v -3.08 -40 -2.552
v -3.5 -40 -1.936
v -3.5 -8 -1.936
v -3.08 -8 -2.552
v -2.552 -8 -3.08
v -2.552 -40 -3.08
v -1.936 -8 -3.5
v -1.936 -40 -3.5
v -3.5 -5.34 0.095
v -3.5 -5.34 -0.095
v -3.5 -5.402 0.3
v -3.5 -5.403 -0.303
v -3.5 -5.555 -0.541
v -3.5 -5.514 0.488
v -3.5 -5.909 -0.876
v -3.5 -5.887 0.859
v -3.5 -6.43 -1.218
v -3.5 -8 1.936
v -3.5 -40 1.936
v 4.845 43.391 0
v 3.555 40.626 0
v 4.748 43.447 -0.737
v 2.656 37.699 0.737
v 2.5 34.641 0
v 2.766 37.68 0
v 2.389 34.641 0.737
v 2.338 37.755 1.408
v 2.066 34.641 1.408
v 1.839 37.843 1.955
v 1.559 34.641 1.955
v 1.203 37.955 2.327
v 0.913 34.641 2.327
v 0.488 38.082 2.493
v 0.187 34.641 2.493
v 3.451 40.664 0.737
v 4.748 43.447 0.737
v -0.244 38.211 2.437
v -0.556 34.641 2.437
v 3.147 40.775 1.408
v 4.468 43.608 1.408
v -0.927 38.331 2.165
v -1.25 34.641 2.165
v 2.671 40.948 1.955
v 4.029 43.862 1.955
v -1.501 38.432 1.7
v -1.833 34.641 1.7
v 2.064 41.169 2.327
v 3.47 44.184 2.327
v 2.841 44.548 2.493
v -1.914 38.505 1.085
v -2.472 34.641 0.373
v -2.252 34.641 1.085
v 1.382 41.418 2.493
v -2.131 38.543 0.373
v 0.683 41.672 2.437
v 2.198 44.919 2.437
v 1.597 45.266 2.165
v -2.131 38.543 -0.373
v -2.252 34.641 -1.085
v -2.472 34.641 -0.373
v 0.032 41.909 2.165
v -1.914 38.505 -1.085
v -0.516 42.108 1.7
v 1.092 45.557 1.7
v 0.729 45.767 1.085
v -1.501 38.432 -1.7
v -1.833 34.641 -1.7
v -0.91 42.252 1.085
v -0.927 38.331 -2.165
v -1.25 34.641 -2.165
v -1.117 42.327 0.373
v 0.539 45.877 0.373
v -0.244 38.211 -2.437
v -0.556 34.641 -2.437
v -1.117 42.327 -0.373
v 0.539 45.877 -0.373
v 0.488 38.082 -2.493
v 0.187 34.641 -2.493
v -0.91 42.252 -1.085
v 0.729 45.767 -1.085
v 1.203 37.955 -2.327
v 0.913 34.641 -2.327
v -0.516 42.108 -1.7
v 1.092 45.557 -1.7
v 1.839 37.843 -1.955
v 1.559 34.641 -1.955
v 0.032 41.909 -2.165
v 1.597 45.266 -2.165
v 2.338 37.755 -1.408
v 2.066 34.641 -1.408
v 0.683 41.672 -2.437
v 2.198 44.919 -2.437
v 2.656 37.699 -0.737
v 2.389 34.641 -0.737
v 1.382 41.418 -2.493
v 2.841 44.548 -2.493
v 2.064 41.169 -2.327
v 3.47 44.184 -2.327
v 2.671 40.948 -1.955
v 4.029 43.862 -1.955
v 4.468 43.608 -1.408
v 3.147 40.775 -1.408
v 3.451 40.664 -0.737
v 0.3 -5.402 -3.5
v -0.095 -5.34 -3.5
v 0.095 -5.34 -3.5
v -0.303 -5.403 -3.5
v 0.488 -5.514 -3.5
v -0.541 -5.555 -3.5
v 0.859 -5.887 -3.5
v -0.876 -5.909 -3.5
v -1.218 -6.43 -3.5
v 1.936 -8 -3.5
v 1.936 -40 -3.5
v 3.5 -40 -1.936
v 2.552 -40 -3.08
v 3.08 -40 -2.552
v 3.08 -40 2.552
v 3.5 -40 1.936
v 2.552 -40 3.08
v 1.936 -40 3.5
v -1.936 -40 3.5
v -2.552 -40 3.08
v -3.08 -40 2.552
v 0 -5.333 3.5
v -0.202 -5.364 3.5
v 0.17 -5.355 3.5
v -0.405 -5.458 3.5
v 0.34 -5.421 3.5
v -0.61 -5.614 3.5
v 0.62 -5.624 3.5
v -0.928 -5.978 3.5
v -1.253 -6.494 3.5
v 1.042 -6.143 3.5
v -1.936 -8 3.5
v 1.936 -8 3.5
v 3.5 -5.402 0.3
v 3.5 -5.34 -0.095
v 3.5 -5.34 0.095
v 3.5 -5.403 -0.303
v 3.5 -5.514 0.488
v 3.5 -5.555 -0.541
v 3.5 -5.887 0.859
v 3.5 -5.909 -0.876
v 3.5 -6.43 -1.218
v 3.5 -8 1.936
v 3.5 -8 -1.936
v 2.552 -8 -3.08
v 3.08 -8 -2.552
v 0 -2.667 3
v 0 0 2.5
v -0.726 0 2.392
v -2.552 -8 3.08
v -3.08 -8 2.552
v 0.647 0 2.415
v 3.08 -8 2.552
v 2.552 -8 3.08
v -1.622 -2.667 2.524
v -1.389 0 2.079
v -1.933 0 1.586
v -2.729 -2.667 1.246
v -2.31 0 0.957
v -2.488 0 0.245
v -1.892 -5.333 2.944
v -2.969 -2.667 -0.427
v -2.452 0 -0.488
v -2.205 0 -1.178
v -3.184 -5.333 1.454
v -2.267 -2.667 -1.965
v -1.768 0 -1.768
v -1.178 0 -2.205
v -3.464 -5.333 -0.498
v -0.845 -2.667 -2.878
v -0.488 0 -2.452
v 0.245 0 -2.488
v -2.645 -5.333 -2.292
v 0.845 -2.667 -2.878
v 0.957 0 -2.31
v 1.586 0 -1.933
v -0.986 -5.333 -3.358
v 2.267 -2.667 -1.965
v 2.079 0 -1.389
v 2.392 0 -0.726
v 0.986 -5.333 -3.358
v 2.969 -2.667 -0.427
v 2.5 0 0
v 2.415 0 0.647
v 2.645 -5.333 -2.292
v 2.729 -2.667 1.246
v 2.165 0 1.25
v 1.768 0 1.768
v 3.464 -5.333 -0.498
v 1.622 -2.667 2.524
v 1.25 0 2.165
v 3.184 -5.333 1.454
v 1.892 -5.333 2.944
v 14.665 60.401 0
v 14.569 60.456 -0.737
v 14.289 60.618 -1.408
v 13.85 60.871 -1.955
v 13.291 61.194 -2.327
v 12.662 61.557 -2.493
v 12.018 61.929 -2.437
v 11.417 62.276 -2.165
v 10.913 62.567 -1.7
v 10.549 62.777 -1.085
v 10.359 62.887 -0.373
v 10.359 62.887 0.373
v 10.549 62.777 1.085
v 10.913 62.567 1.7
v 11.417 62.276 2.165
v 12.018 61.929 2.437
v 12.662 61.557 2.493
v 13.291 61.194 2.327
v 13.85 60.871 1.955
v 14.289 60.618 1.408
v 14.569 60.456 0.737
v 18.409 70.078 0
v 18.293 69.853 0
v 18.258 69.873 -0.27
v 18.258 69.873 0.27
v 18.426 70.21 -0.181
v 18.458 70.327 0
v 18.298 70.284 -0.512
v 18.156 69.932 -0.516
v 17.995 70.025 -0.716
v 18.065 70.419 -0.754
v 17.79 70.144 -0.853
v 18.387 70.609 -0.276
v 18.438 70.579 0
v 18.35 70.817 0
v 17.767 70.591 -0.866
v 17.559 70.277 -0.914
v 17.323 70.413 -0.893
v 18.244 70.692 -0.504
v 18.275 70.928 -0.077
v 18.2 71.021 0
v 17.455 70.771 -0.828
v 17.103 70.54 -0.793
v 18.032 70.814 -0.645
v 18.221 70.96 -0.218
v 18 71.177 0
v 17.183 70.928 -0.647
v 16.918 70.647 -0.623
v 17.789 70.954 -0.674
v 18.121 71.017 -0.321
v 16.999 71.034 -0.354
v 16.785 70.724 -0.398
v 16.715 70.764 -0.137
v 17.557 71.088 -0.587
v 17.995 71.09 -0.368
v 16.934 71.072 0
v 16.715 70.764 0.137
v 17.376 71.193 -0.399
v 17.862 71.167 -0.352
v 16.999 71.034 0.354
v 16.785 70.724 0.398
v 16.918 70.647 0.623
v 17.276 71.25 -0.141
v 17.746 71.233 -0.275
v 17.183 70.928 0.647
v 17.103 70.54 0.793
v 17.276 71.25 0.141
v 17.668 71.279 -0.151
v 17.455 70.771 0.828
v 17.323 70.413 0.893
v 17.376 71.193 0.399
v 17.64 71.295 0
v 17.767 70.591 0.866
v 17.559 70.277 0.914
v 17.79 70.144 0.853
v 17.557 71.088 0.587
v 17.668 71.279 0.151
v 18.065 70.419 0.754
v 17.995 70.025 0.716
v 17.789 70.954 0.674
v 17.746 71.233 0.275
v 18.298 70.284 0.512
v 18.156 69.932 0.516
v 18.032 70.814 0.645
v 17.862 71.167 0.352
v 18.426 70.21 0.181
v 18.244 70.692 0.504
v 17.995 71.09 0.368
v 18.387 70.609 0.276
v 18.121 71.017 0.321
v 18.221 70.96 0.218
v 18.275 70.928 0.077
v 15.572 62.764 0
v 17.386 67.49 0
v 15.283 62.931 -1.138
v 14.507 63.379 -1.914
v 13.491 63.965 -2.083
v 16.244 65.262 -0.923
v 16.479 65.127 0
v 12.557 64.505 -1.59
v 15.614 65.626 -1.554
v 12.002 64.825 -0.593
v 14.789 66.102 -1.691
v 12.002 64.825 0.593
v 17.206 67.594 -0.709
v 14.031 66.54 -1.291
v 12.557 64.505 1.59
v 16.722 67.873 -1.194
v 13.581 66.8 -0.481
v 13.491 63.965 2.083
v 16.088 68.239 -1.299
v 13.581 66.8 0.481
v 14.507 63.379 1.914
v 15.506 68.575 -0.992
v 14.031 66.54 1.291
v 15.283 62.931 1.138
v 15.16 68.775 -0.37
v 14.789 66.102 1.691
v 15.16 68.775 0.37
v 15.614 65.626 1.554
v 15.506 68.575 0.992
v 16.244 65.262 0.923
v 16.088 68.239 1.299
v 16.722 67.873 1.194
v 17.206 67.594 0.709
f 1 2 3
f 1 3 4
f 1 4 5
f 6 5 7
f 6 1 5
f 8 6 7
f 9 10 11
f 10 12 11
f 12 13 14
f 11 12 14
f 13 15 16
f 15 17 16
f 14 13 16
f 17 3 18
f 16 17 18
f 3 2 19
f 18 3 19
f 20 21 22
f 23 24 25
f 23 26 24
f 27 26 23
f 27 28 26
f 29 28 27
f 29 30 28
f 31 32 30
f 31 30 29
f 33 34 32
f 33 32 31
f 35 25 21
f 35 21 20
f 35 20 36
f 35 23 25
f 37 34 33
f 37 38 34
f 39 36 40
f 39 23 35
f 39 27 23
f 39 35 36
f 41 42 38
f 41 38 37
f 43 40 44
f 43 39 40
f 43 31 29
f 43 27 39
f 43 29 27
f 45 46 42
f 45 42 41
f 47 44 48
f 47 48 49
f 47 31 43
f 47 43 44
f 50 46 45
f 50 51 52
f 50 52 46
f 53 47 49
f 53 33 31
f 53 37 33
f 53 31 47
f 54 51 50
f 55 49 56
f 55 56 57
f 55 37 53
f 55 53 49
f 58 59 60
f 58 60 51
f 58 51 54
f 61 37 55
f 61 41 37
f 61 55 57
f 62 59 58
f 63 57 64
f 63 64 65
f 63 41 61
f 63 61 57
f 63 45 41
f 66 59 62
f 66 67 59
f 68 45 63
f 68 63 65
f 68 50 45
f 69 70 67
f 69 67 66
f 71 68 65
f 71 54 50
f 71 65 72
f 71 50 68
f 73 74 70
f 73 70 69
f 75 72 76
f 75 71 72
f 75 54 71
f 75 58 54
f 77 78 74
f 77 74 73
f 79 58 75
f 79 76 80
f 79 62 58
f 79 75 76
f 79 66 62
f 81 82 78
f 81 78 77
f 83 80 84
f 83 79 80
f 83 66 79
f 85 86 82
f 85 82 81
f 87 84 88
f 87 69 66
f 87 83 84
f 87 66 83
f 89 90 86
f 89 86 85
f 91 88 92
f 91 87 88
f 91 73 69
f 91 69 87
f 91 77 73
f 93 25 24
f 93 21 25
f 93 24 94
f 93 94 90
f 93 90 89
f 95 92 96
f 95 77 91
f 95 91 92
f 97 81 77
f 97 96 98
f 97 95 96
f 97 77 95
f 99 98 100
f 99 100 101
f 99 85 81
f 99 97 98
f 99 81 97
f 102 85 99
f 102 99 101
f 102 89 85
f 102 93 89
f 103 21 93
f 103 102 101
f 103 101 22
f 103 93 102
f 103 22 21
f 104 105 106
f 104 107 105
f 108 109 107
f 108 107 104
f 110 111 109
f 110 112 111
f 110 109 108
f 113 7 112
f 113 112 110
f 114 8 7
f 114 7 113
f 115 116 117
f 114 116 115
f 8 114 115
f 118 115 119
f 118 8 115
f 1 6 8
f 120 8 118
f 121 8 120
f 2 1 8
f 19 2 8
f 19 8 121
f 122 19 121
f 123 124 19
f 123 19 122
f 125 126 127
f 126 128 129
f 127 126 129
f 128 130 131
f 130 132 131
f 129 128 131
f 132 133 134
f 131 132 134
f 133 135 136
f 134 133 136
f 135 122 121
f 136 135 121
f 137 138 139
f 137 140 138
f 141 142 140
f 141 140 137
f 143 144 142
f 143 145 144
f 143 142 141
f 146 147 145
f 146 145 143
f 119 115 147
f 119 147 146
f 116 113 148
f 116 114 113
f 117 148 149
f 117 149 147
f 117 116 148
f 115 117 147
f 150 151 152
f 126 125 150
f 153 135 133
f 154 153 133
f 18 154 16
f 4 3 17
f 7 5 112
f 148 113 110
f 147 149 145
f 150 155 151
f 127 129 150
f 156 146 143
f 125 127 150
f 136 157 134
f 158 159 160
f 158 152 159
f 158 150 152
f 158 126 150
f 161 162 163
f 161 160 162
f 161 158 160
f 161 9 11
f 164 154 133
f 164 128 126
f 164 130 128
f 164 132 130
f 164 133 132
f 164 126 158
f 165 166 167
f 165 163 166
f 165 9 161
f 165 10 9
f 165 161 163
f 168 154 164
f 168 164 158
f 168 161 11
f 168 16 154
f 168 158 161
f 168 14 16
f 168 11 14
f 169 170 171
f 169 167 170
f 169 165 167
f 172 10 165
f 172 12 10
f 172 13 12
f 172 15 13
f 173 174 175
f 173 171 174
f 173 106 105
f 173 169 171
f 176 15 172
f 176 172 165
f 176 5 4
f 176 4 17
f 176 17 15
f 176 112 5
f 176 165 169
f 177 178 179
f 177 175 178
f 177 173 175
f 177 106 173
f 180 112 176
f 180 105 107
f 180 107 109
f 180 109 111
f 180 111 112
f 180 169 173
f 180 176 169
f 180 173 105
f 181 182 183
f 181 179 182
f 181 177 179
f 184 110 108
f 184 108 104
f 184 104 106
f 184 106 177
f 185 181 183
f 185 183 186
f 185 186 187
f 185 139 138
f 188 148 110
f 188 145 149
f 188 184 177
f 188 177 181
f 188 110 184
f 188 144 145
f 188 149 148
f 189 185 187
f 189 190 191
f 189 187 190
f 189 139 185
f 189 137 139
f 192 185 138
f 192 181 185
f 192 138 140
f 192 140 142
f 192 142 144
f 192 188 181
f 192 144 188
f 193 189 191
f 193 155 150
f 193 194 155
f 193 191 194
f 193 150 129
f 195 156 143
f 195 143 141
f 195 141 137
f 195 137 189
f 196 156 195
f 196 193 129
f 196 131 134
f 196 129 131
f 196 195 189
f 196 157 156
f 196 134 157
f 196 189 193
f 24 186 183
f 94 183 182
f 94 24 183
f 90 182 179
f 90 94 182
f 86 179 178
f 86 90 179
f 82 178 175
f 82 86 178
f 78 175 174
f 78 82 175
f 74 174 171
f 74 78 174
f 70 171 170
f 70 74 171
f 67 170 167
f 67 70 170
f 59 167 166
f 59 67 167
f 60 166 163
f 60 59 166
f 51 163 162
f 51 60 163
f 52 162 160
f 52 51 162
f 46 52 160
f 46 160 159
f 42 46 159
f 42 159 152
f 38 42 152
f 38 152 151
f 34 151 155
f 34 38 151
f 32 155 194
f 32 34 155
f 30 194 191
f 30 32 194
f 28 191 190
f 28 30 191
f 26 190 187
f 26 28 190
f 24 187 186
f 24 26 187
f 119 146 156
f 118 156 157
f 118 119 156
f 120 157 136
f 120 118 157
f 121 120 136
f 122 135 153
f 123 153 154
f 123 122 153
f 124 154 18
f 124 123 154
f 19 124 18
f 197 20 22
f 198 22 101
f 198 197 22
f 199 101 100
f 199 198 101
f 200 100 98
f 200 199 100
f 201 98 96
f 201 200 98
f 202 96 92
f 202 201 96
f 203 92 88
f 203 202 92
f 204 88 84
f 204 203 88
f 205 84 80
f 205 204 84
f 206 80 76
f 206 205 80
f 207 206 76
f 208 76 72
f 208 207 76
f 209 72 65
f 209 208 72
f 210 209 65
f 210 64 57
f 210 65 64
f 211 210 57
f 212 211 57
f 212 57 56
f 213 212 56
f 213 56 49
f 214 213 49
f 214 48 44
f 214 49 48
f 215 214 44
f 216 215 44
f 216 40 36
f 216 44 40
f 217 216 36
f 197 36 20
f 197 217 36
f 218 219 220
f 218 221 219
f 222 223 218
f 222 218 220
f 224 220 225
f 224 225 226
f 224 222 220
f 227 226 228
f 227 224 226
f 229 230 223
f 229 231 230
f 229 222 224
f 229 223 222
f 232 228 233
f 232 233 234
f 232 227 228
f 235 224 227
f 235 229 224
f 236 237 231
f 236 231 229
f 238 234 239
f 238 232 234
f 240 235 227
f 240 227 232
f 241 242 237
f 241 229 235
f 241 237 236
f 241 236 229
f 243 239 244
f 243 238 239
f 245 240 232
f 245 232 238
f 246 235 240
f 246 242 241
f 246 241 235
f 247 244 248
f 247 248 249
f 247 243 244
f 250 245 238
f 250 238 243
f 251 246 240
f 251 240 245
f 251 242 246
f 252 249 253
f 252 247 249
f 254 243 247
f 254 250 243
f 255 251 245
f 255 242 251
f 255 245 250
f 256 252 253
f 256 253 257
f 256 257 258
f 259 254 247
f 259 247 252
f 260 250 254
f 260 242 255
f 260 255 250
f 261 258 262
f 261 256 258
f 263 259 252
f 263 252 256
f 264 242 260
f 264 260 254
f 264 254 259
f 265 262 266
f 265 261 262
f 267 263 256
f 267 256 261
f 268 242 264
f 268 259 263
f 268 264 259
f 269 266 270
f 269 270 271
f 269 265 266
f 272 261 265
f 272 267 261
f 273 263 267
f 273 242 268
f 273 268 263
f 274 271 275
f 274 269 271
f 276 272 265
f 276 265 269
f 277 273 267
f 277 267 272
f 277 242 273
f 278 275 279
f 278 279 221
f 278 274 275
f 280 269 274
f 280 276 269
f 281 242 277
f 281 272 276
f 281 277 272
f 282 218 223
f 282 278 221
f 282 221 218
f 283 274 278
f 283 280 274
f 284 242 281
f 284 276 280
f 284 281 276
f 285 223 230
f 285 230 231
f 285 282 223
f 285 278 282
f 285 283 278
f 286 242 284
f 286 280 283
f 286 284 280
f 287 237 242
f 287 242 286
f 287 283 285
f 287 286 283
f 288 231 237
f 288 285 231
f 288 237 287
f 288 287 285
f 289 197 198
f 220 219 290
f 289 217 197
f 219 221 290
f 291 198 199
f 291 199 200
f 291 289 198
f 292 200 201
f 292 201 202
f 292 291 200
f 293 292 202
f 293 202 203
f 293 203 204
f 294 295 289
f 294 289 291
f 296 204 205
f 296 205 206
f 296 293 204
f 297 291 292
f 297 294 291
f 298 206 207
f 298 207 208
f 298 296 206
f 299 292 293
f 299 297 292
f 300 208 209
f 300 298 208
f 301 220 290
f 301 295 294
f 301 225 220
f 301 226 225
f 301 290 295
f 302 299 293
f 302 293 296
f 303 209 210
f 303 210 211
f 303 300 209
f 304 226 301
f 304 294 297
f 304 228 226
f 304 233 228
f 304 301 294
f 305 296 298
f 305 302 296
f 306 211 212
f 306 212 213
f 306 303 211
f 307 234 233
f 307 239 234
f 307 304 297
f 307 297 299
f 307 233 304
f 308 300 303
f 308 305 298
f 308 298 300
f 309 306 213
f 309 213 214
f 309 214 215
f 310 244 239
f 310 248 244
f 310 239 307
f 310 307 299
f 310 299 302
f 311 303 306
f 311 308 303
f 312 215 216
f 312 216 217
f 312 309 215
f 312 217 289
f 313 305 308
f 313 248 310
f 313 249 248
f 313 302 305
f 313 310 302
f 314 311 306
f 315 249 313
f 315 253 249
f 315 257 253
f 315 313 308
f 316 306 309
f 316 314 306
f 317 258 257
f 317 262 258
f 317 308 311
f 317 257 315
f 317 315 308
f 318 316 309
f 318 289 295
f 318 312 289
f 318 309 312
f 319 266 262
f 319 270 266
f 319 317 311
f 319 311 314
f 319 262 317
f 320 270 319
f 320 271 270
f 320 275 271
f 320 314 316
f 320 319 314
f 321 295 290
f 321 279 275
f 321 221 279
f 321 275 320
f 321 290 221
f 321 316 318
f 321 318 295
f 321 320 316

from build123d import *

# Parameters (mm, degrees)
SKETCH_2_R          = 2.5
CHAMFER_1_SIZE      = 10
CHAMFER_1_SIZE2     = 1.583844403
SKETCH_4_W          = 3.296860699
SKETCH_4_H          = 5.658889041
SKETCH_4_W_2        = 5.658889041
SKETCH_4_H_2        = 3.296860699
CUT_EXTRUDE_1_DEPTH = 40
DOME_1_FACE_RADIUS  = 0.916155597
DOME_1_HEIGHT       = 1


with BuildPart() as part:
    # 扫描1: sweep along a path in 草图1
    with BuildLine(Plane.XY) as sweep_1_path:
        Line((0, 0), (0, 34.641016151))
        ThreePointArc((0, 34.641016151), (0.681483474, 39.817397053), (2.679491924, 44.641016151))
        Line((2.679491924, 44.641016151), (17.5, 70.310889132))
    # 草图2 → 扫描1 (sweep)
    with BuildSketch(Plane(origin=(0, 0, 0), x_dir=(1, 0, 0), z_dir=(0, 1, 0))):
        Circle(SKETCH_2_R)
    sweep(path=sweep_1_path.line)

    # 草图3 → 旋转1 (revolve)
    with BuildSketch(Plane.XY, mode=Mode.PRIVATE) as revolve_1_sk:
        Polygon((0, 0), (2.5, 0), (4, -8), (4, -40), (0, -40), align=None)
    revolve(revolve_1_sk.sketch.rotate(Axis((0, 0, 0), (0, -1, 0)), 90), axis=Axis((0, 0, 0), (0, -1, 0)))

    # 倒角1
    chamfer_1_edges = [part.edges().sort_by_distance(p)[0] for p in [
        (15.334936491, 71.560889132, 0),
    ]]
    chamfer_1_side = [part.faces().sort_by_distance(p)[0] for p in [
        (7.924682453, 58.725952642, 0),
    ]]
    chamfer(chamfer_1_edges, length=CHAMFER_1_SIZE, length2=CHAMFER_1_SIZE2, reference=chamfer_1_side[0])

    # 草图4 → 切除-拉伸1 (cut)
    with BuildSketch(Plane.XZ.offset(40)):
        with Locations((5.148430349, -0.020531218)):
            Rectangle(SKETCH_4_W, SKETCH_4_H)
        with Locations((0.020531218, 5.148430349)):
            Rectangle(SKETCH_4_W_2, SKETCH_4_H_2)
        with Locations((-0.020531218, -5.148430349)):
            Rectangle(SKETCH_4_W_2, SKETCH_4_H_2)
        with Locations((-5.148430349, 0.020531218)):
            Rectangle(SKETCH_4_W, SKETCH_4_H)
    extrude(amount=-CUT_EXTRUDE_1_DEPTH, mode=Mode.SUBTRACT)

    # 圆顶1: a dome of height H over a round flat face of radius A is a cap of a sphere of radius (A * A + H * H) / (2 * H)
    dome_1_r = (DOME_1_FACE_RADIUS * DOME_1_FACE_RADIUS + DOME_1_HEIGHT * DOME_1_HEIGHT) / (2 * DOME_1_HEIGHT)
    dome_1_base = Plane((17.5, 70.310889132, 0), z_dir=(0.5, 0.866025403784, 0))
    with Locations(dome_1_base.offset(DOME_1_HEIGHT - dome_1_r)):
        dome_1_ball = Sphere(dome_1_r, mode=Mode.PRIVATE)
    add(split(dome_1_ball, bisect_by=dome_1_base, keep=Keep.TOP, mode=Mode.PRIVATE))


solid = part.part
